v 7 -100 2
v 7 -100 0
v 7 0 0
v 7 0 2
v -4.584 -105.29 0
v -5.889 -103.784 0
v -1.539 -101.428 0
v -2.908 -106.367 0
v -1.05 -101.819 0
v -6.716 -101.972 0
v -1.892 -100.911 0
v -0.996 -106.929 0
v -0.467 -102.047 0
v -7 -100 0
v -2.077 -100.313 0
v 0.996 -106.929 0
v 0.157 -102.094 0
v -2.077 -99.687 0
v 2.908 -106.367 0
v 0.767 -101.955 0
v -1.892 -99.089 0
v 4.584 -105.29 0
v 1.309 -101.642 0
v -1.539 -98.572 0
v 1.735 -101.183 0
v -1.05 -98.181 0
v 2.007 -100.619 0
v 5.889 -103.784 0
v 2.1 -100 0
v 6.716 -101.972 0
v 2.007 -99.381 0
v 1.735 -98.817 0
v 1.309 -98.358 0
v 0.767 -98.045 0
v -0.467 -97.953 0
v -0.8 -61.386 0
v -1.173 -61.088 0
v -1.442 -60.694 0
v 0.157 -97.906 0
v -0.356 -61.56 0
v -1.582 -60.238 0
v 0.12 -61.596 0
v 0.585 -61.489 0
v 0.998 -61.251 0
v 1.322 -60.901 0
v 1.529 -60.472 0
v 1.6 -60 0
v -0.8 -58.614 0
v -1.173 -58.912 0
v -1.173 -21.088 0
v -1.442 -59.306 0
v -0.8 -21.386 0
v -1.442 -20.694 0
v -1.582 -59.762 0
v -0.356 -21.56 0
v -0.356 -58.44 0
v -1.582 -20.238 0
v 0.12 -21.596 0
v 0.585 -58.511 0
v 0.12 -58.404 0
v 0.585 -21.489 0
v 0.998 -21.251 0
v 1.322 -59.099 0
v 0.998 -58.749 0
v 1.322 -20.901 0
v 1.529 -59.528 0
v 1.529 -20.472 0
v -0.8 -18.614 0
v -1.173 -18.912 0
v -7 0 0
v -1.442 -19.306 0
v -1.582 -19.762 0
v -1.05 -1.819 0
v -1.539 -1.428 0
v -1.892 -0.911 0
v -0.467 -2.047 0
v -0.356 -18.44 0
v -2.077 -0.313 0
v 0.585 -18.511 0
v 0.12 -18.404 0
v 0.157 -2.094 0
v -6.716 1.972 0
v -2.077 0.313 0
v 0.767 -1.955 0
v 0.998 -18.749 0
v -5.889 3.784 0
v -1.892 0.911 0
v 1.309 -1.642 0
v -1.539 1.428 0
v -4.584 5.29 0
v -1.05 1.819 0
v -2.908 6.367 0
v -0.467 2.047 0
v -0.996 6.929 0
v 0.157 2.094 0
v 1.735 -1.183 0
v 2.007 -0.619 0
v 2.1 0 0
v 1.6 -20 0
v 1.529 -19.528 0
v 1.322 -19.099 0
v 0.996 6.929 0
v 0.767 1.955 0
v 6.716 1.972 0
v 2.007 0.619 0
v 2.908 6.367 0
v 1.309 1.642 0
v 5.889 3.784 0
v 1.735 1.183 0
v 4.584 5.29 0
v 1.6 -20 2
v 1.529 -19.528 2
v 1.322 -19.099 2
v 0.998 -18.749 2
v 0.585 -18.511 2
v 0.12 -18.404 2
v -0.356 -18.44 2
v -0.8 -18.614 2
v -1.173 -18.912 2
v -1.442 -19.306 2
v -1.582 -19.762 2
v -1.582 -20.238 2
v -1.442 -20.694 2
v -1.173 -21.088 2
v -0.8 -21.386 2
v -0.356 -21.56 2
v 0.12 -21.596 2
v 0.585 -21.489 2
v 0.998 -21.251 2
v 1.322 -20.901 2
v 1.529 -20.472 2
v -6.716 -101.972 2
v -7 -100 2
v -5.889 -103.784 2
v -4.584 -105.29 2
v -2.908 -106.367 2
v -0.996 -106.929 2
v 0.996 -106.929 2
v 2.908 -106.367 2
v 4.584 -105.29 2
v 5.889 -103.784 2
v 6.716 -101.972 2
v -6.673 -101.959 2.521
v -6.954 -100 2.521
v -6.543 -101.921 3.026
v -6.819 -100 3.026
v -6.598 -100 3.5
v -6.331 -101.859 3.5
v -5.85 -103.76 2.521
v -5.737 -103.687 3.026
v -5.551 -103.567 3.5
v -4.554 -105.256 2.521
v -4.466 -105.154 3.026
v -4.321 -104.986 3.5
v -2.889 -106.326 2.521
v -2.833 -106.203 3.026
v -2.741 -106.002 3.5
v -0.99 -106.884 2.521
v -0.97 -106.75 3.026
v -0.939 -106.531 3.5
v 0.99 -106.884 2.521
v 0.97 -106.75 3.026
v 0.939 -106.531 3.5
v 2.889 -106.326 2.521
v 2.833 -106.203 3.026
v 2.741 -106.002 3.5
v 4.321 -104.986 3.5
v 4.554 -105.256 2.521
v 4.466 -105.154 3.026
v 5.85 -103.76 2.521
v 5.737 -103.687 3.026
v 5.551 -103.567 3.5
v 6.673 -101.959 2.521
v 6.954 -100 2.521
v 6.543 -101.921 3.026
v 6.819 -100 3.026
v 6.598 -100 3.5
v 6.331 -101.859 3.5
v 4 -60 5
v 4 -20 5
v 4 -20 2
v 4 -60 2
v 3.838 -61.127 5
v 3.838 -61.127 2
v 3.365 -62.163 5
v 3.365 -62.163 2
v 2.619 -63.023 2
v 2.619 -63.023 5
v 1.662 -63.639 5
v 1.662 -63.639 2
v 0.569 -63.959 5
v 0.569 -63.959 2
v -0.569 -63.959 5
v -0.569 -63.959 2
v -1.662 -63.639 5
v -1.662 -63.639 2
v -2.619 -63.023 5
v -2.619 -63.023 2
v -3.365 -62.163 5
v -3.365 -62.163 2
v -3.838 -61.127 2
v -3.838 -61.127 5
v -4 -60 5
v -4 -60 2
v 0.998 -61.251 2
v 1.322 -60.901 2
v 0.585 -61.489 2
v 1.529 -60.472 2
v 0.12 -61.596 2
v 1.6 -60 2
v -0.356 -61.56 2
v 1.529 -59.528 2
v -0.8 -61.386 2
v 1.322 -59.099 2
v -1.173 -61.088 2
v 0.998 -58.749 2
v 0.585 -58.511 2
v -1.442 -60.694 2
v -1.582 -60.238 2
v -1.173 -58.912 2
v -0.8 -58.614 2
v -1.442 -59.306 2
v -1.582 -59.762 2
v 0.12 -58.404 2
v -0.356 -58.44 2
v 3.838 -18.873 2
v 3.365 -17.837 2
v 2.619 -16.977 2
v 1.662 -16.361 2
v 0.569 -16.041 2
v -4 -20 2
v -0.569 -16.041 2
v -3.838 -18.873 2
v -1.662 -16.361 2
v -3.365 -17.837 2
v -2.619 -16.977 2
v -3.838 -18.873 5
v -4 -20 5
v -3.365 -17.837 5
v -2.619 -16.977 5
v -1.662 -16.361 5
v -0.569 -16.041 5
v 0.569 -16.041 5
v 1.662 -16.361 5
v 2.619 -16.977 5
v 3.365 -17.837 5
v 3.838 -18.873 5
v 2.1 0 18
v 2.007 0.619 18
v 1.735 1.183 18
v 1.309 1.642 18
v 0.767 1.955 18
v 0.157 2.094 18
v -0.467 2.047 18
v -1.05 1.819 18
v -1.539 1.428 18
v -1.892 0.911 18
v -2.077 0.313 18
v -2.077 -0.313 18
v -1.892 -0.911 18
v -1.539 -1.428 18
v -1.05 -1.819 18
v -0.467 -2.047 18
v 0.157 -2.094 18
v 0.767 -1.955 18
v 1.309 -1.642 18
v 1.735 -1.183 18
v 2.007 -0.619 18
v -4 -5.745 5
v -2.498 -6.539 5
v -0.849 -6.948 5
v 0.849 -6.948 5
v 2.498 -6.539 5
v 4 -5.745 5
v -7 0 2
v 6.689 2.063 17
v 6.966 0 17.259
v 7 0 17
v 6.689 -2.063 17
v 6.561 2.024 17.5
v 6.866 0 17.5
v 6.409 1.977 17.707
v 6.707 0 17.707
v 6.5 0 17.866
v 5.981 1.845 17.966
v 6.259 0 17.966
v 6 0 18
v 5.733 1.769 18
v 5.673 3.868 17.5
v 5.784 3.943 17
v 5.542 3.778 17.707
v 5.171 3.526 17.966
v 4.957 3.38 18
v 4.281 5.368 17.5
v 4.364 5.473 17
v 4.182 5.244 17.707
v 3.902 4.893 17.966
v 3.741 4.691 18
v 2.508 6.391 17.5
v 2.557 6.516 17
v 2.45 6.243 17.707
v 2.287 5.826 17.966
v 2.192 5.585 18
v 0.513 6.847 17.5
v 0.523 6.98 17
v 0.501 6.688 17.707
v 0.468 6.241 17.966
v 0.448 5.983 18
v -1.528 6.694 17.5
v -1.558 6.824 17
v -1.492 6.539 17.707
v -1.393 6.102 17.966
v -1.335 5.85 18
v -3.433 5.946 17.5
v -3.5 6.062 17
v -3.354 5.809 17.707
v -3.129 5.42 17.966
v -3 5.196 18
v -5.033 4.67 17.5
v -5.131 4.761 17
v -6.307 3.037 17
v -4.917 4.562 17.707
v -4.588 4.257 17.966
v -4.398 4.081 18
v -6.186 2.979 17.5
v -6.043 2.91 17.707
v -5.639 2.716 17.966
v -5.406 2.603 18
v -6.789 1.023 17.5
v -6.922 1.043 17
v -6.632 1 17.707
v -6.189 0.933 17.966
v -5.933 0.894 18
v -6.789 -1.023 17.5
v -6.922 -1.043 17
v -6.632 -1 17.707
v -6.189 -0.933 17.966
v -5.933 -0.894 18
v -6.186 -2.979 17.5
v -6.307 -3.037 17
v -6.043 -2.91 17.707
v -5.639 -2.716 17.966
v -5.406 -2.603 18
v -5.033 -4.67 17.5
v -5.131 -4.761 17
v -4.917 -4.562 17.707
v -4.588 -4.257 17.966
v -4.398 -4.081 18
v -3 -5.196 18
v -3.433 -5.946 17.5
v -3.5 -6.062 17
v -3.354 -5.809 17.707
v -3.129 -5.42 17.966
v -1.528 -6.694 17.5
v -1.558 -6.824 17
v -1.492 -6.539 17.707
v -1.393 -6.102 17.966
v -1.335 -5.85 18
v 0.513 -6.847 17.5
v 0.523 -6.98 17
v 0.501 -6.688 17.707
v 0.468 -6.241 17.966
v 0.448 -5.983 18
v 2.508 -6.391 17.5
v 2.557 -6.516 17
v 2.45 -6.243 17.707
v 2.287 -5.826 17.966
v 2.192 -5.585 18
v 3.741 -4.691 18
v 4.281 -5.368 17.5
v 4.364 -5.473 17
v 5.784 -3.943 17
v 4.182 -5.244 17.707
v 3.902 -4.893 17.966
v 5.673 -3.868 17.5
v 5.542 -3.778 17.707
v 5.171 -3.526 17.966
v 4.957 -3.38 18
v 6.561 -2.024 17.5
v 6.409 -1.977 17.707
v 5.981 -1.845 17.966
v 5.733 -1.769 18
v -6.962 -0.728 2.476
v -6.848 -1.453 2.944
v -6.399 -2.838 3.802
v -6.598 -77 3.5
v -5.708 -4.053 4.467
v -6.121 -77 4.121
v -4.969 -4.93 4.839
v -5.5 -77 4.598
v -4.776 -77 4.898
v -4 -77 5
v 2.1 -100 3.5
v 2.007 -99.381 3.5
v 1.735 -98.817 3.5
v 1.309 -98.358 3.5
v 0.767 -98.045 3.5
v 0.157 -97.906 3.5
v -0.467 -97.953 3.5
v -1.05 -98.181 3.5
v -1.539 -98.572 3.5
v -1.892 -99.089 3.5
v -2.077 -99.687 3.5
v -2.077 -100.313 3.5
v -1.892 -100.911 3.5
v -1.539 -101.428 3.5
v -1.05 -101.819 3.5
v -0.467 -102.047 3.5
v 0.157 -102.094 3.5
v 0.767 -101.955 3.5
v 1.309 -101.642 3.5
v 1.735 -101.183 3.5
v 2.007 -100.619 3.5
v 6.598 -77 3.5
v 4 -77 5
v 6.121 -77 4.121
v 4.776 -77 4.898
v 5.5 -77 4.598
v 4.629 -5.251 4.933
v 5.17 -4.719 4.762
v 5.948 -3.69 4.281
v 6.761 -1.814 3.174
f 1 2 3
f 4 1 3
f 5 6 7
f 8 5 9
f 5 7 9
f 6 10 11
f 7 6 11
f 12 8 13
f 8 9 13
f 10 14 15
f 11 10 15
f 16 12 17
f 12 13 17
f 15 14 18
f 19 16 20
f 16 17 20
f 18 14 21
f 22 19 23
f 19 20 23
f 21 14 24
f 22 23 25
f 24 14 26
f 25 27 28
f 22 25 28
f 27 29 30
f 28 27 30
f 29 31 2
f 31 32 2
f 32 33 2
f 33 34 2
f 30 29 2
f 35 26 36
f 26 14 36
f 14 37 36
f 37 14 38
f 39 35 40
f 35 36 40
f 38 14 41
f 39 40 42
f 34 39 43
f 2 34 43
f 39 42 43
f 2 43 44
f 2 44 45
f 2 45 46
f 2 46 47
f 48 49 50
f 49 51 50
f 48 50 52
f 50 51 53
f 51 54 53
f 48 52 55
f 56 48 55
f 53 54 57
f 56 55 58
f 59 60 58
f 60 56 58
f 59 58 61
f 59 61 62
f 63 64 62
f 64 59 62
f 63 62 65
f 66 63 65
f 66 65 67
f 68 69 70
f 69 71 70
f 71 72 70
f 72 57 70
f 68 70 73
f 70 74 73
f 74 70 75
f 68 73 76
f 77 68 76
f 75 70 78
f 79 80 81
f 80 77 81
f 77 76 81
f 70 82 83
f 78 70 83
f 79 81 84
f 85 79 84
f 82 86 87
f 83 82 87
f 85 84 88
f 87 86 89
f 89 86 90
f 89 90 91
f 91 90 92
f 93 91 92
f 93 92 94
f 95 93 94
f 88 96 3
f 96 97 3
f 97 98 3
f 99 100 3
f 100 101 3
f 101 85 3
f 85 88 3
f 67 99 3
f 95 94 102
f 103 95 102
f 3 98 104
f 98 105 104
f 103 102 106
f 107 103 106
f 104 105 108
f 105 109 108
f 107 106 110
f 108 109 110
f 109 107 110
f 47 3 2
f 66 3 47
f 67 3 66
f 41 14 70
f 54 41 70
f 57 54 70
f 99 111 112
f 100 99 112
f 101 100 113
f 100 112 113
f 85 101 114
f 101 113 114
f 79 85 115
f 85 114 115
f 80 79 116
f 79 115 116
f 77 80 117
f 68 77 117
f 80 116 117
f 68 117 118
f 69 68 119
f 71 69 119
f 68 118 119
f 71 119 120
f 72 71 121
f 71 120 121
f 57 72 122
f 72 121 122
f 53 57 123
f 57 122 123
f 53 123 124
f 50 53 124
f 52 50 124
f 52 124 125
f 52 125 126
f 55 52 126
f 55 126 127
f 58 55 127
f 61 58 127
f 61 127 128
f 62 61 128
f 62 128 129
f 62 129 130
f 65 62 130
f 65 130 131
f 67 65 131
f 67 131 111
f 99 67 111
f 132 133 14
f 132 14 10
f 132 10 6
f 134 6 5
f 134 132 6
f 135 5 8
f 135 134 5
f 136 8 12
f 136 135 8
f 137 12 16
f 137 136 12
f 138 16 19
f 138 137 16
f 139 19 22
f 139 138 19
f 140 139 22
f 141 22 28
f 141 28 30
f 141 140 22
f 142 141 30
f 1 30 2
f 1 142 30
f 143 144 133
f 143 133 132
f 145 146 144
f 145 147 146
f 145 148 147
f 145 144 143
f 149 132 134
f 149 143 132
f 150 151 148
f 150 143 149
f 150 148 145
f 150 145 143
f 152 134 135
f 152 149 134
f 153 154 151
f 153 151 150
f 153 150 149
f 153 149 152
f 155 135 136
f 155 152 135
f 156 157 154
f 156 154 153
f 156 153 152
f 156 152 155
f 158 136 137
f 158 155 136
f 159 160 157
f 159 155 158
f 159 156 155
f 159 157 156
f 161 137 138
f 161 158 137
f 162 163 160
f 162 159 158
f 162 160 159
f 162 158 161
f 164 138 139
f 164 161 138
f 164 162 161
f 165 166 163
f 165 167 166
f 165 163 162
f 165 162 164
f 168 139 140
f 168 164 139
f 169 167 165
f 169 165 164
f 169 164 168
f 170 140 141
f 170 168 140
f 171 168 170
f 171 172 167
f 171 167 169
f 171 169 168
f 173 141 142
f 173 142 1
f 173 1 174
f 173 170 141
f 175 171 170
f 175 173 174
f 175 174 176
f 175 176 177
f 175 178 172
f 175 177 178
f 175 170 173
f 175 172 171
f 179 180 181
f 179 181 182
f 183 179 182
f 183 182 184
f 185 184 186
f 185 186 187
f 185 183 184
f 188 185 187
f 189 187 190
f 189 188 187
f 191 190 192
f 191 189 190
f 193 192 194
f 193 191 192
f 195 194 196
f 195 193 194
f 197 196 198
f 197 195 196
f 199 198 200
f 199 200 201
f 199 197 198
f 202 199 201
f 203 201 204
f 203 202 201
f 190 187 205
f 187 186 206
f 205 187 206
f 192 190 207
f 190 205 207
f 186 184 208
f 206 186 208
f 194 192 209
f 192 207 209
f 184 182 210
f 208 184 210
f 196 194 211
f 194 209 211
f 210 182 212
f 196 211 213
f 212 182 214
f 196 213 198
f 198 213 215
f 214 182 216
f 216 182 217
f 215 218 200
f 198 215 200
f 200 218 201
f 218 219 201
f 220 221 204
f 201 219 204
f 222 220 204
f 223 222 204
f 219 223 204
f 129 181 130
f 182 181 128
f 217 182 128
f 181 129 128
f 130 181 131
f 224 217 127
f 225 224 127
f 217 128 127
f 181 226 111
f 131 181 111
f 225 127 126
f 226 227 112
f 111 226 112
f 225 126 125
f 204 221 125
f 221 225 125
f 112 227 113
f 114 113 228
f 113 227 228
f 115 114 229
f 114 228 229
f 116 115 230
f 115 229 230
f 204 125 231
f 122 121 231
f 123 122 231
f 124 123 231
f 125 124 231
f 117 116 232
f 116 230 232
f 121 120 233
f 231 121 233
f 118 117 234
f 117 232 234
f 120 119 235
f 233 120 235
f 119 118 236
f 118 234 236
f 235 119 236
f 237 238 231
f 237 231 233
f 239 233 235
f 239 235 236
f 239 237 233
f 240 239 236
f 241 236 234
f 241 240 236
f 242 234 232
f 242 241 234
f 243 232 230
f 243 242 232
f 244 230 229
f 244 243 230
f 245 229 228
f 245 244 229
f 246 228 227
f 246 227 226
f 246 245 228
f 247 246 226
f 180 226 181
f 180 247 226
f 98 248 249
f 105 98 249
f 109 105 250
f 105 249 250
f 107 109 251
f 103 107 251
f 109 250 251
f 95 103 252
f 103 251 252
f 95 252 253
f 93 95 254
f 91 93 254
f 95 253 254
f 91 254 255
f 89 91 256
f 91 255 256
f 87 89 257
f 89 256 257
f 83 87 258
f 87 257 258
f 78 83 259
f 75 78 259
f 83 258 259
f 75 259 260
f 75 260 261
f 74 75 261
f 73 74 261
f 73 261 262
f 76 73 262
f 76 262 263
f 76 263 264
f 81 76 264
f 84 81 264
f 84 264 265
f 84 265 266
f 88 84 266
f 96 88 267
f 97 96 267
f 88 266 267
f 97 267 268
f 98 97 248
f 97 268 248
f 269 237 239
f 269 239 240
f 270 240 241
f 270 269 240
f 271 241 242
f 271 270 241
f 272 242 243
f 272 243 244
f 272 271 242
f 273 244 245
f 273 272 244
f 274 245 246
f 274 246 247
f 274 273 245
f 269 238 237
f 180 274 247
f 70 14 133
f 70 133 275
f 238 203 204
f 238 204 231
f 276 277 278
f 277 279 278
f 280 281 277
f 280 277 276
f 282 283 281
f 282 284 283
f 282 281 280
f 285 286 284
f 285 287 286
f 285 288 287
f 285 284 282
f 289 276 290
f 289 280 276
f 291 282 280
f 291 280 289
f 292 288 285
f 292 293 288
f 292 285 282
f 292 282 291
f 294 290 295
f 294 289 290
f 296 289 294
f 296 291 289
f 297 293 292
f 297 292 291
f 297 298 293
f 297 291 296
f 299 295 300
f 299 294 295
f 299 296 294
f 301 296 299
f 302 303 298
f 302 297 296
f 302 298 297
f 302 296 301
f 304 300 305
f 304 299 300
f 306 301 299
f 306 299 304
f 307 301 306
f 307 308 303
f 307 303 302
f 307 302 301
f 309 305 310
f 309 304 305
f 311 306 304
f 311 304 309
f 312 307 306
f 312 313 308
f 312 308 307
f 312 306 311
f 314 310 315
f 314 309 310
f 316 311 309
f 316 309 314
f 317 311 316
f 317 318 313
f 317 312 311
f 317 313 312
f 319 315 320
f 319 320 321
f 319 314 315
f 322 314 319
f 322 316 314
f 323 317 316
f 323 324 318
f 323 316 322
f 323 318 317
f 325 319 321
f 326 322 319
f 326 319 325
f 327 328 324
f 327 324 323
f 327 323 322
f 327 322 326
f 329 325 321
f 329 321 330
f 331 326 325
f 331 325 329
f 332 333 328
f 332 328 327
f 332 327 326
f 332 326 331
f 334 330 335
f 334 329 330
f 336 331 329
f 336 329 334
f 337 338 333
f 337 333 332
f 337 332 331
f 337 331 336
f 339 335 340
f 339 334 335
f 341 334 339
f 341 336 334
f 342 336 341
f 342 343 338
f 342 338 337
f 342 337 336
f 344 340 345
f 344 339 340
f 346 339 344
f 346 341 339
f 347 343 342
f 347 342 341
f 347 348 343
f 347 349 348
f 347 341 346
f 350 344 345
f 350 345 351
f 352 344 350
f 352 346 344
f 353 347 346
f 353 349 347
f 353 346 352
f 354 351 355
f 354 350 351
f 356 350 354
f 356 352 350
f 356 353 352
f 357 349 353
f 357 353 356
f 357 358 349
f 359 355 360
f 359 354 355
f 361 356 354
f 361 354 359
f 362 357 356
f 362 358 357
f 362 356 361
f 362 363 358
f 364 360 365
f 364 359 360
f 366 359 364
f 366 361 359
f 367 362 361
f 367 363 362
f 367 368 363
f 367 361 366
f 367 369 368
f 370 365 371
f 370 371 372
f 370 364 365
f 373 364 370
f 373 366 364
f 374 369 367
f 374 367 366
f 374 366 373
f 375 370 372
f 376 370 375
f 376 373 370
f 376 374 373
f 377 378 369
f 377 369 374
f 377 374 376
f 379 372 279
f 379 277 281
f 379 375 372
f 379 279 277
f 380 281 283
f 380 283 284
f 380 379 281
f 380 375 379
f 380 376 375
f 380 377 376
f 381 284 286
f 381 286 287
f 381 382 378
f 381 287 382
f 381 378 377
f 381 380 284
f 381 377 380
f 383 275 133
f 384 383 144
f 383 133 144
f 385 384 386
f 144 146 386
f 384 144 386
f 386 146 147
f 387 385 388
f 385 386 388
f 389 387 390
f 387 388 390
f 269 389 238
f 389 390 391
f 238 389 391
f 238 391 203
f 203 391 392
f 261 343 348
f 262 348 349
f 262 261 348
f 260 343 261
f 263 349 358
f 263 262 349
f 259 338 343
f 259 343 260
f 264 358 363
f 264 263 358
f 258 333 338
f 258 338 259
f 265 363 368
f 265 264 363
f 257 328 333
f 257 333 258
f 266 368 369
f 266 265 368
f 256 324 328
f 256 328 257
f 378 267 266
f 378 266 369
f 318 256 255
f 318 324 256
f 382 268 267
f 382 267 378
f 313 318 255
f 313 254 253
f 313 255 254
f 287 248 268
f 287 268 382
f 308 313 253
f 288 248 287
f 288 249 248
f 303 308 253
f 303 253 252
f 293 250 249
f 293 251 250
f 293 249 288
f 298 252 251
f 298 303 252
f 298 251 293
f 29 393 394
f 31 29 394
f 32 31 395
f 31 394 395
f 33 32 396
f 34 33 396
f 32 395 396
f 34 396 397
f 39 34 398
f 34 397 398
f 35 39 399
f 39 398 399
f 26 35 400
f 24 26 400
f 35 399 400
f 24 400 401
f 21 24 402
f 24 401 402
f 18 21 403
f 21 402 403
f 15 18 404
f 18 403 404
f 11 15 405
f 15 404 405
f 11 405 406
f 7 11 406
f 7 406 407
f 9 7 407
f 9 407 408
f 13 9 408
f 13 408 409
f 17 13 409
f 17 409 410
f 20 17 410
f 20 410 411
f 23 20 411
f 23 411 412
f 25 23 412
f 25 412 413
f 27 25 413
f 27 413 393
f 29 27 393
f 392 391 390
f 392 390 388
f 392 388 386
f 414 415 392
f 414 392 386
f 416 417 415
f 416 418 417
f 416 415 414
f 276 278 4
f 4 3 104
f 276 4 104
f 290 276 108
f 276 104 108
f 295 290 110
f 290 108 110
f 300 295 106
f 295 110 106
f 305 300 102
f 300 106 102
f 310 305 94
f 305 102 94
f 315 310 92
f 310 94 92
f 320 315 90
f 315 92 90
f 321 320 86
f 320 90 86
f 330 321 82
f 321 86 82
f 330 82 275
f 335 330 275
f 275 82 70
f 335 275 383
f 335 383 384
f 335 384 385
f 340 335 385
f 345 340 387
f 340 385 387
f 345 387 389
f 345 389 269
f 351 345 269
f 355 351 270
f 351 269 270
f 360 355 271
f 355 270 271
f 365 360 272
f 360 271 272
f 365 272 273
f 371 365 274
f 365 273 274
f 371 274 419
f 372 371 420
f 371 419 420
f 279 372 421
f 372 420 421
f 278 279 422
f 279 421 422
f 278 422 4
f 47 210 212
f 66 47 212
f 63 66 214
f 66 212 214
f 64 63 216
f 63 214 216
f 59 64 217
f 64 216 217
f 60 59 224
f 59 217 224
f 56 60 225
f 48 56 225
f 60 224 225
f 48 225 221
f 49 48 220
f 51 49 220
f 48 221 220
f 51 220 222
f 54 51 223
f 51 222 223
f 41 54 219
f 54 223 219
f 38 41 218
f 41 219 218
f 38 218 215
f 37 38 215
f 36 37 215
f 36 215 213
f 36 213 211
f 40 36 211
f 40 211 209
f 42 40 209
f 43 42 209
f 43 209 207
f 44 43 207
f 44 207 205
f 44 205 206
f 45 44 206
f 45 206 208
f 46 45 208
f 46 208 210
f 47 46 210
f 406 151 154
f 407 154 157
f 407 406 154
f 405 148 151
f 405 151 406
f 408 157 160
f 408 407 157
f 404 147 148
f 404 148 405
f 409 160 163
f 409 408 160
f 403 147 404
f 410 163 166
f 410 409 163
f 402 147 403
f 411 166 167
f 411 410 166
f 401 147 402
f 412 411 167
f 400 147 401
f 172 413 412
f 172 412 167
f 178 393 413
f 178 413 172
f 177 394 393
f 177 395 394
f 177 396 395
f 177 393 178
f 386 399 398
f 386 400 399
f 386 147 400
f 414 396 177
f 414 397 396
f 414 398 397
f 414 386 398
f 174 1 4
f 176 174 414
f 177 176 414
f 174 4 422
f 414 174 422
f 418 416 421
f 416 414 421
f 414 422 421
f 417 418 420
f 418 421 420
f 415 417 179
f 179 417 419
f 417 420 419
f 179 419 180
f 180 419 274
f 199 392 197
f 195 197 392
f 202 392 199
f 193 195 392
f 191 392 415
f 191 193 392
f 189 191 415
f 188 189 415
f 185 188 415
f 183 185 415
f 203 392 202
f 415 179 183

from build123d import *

# Parameters (mm, degrees)
SKETCH1_R           = 7
BOSS_EXTRUDE1_DEPTH = 18
SKETCH2_W           = 14
SKETCH2_H           = 100
BOSS_EXTRUDE2_DEPTH = 5
SKETCH8_R           = 2.1
CUT_EXTRUDE5_DEPTH  = 18
SKETCH9_R           = 7
BOSS_EXTRUDE4_DEPTH = 5
FILLET3_R           = 3
CUT_EXTRUDE6_DEPTH  = 3
SKETCH10_R          = 1.6
CUT_EXTRUDE7_DEPTH  = 3
SKETCH11_W          = 14
SKETCH11_H          = 30
CUT_EXTRUDE8_DEPTH  = 1.5
SKETCH12_R          = 2.1
CUT_EXTRUDE9_DEPTH  = 4
FILLET4_R           = 1


with BuildPart() as part:
    # Sketch1 → Boss-Extrude1 (new body)
    with BuildSketch(Plane.XY):
        Circle(SKETCH1_R)
    extrude(amount=BOSS_EXTRUDE1_DEPTH)

    # Sketch2 → Boss-Extrude2 (add)
    with BuildSketch(Plane.XY):
        with Locations((0, -50)):
            Rectangle(SKETCH2_W, SKETCH2_H)
    extrude(amount=BOSS_EXTRUDE2_DEPTH)

    # Sketch8 → Cut-Extrude5 (cut)
    with BuildSketch(Plane.XY.offset(18)):
        Circle(SKETCH8_R)
    extrude(amount=-CUT_EXTRUDE5_DEPTH, mode=Mode.SUBTRACT)

    # Sketch9 → Boss-Extrude4 (add)
    with BuildSketch(Plane.XY.offset(5)):
        with Locations((0, -100)):
            Circle(SKETCH9_R)
    extrude(amount=-BOSS_EXTRUDE4_DEPTH)

    # Fillet3
    # the kernel refuses this fillet: 3 mm, written as the material it takes off along each edge
    with BuildSketch(Plane(origin=(7, 7.5, 5), x_dir=(-1, 0, 0), z_dir=(0, -1, 0))) as fillet3_piece_1_section:
        with BuildLine():
            CenterArc((FILLET3_R, FILLET3_R), FILLET3_R, 180, 90)
            Line((0, FILLET3_R), (0, 0))
            Line((0, 0), (FILLET3_R, 0))
        make_face()
    fillet3_piece_1 = extrude(amount=107.5, mode=Mode.PRIVATE)
    fillet3_piece_1 = fillet3_piece_1 - Plane(origin=(0, 0, 4.308954976), x_dir=(1, 0, 0), z_dir=(0, 0, -1)) * Cylinder(7, 227, mode=Mode.PRIVATE)
    add(fillet3_piece_1, mode=Mode.SUBTRACT)
    with BuildSketch(Plane(origin=(0, -100, 5), x_dir=(-1, 0, 0), z_dir=(0, 1, 0))) as fillet3_piece_2:
        with BuildLine():
            CenterArc((7 - FILLET3_R, -FILLET3_R), FILLET3_R, 0, 90)
            Line((7, -FILLET3_R), (7, 0))
            Line((7, 0), (7 - FILLET3_R, 0))
        make_face()
    revolve(axis=Axis((0, -100, 5), (0, 0, 1)), revolution_arc=180, mode=Mode.SUBTRACT)
    with BuildSketch(Plane(origin=(-7, -100, 5), x_dir=(0, 0, -1), z_dir=(0, 1, 0))) as fillet3_piece_3_section:
        with BuildLine():
            CenterArc((FILLET3_R, -FILLET3_R), FILLET3_R, 90, 90)
            Line((0, -FILLET3_R), (0, 0))
            Line((0, 0), (FILLET3_R, 0))
        make_face()
    fillet3_piece_3 = extrude(amount=107.5, mode=Mode.PRIVATE)
    fillet3_piece_3 = fillet3_piece_3 - Plane(origin=(0, 0, 4.308954508), x_dir=(1, 0, 0), z_dir=(0, 0, -1)) * Cylinder(7, 227, mode=Mode.PRIVATE)
    add(fillet3_piece_3, mode=Mode.SUBTRACT)

    # Sketch6 → Cut-Extrude6 (cut)
    with BuildSketch(Plane.XY.offset(5)):
        with BuildLine():
            Line((4, -20), (4, -60))
            ThreePointArc((4, -60), (0, -64), (-4, -60))
            Line((-4, -60), (-4, -20))
            ThreePointArc((-4, -20), (0, -16), (4, -20))
        make_face()
    extrude(amount=-CUT_EXTRUDE6_DEPTH, mode=Mode.SUBTRACT)

    # Sketch10 → Cut-Extrude7 (cut)
    with BuildSketch(Plane.XY.offset(2)):
        with Locations((0, -20)):
            Circle(SKETCH10_R)
        with Locations((0, -60)):
            Circle(SKETCH10_R)
    extrude(amount=-CUT_EXTRUDE7_DEPTH, mode=Mode.SUBTRACT)

    # Sketch11 → Cut-Extrude8 (cut)
    with BuildSketch(Plane.XY.offset(5)):
        with Locations((0, -92)):
            Rectangle(SKETCH11_W, SKETCH11_H)
    extrude(amount=-CUT_EXTRUDE8_DEPTH, mode=Mode.SUBTRACT)

    # Sketch12 → Cut-Extrude9 (cut)
    with BuildSketch(Plane.XY.offset(3.5)):
        with Locations((0, -100)):
            Circle(SKETCH12_R)
    extrude(amount=-CUT_EXTRUDE9_DEPTH, mode=Mode.SUBTRACT)

    # Fillet4
    fillet4_edges = [part.edges().sort_by_distance(p)[0] for p in [
        (-7, 0, 18),
    ]]
    fillet(fillet4_edges, radius=FILLET4_R)


solid = part.part
